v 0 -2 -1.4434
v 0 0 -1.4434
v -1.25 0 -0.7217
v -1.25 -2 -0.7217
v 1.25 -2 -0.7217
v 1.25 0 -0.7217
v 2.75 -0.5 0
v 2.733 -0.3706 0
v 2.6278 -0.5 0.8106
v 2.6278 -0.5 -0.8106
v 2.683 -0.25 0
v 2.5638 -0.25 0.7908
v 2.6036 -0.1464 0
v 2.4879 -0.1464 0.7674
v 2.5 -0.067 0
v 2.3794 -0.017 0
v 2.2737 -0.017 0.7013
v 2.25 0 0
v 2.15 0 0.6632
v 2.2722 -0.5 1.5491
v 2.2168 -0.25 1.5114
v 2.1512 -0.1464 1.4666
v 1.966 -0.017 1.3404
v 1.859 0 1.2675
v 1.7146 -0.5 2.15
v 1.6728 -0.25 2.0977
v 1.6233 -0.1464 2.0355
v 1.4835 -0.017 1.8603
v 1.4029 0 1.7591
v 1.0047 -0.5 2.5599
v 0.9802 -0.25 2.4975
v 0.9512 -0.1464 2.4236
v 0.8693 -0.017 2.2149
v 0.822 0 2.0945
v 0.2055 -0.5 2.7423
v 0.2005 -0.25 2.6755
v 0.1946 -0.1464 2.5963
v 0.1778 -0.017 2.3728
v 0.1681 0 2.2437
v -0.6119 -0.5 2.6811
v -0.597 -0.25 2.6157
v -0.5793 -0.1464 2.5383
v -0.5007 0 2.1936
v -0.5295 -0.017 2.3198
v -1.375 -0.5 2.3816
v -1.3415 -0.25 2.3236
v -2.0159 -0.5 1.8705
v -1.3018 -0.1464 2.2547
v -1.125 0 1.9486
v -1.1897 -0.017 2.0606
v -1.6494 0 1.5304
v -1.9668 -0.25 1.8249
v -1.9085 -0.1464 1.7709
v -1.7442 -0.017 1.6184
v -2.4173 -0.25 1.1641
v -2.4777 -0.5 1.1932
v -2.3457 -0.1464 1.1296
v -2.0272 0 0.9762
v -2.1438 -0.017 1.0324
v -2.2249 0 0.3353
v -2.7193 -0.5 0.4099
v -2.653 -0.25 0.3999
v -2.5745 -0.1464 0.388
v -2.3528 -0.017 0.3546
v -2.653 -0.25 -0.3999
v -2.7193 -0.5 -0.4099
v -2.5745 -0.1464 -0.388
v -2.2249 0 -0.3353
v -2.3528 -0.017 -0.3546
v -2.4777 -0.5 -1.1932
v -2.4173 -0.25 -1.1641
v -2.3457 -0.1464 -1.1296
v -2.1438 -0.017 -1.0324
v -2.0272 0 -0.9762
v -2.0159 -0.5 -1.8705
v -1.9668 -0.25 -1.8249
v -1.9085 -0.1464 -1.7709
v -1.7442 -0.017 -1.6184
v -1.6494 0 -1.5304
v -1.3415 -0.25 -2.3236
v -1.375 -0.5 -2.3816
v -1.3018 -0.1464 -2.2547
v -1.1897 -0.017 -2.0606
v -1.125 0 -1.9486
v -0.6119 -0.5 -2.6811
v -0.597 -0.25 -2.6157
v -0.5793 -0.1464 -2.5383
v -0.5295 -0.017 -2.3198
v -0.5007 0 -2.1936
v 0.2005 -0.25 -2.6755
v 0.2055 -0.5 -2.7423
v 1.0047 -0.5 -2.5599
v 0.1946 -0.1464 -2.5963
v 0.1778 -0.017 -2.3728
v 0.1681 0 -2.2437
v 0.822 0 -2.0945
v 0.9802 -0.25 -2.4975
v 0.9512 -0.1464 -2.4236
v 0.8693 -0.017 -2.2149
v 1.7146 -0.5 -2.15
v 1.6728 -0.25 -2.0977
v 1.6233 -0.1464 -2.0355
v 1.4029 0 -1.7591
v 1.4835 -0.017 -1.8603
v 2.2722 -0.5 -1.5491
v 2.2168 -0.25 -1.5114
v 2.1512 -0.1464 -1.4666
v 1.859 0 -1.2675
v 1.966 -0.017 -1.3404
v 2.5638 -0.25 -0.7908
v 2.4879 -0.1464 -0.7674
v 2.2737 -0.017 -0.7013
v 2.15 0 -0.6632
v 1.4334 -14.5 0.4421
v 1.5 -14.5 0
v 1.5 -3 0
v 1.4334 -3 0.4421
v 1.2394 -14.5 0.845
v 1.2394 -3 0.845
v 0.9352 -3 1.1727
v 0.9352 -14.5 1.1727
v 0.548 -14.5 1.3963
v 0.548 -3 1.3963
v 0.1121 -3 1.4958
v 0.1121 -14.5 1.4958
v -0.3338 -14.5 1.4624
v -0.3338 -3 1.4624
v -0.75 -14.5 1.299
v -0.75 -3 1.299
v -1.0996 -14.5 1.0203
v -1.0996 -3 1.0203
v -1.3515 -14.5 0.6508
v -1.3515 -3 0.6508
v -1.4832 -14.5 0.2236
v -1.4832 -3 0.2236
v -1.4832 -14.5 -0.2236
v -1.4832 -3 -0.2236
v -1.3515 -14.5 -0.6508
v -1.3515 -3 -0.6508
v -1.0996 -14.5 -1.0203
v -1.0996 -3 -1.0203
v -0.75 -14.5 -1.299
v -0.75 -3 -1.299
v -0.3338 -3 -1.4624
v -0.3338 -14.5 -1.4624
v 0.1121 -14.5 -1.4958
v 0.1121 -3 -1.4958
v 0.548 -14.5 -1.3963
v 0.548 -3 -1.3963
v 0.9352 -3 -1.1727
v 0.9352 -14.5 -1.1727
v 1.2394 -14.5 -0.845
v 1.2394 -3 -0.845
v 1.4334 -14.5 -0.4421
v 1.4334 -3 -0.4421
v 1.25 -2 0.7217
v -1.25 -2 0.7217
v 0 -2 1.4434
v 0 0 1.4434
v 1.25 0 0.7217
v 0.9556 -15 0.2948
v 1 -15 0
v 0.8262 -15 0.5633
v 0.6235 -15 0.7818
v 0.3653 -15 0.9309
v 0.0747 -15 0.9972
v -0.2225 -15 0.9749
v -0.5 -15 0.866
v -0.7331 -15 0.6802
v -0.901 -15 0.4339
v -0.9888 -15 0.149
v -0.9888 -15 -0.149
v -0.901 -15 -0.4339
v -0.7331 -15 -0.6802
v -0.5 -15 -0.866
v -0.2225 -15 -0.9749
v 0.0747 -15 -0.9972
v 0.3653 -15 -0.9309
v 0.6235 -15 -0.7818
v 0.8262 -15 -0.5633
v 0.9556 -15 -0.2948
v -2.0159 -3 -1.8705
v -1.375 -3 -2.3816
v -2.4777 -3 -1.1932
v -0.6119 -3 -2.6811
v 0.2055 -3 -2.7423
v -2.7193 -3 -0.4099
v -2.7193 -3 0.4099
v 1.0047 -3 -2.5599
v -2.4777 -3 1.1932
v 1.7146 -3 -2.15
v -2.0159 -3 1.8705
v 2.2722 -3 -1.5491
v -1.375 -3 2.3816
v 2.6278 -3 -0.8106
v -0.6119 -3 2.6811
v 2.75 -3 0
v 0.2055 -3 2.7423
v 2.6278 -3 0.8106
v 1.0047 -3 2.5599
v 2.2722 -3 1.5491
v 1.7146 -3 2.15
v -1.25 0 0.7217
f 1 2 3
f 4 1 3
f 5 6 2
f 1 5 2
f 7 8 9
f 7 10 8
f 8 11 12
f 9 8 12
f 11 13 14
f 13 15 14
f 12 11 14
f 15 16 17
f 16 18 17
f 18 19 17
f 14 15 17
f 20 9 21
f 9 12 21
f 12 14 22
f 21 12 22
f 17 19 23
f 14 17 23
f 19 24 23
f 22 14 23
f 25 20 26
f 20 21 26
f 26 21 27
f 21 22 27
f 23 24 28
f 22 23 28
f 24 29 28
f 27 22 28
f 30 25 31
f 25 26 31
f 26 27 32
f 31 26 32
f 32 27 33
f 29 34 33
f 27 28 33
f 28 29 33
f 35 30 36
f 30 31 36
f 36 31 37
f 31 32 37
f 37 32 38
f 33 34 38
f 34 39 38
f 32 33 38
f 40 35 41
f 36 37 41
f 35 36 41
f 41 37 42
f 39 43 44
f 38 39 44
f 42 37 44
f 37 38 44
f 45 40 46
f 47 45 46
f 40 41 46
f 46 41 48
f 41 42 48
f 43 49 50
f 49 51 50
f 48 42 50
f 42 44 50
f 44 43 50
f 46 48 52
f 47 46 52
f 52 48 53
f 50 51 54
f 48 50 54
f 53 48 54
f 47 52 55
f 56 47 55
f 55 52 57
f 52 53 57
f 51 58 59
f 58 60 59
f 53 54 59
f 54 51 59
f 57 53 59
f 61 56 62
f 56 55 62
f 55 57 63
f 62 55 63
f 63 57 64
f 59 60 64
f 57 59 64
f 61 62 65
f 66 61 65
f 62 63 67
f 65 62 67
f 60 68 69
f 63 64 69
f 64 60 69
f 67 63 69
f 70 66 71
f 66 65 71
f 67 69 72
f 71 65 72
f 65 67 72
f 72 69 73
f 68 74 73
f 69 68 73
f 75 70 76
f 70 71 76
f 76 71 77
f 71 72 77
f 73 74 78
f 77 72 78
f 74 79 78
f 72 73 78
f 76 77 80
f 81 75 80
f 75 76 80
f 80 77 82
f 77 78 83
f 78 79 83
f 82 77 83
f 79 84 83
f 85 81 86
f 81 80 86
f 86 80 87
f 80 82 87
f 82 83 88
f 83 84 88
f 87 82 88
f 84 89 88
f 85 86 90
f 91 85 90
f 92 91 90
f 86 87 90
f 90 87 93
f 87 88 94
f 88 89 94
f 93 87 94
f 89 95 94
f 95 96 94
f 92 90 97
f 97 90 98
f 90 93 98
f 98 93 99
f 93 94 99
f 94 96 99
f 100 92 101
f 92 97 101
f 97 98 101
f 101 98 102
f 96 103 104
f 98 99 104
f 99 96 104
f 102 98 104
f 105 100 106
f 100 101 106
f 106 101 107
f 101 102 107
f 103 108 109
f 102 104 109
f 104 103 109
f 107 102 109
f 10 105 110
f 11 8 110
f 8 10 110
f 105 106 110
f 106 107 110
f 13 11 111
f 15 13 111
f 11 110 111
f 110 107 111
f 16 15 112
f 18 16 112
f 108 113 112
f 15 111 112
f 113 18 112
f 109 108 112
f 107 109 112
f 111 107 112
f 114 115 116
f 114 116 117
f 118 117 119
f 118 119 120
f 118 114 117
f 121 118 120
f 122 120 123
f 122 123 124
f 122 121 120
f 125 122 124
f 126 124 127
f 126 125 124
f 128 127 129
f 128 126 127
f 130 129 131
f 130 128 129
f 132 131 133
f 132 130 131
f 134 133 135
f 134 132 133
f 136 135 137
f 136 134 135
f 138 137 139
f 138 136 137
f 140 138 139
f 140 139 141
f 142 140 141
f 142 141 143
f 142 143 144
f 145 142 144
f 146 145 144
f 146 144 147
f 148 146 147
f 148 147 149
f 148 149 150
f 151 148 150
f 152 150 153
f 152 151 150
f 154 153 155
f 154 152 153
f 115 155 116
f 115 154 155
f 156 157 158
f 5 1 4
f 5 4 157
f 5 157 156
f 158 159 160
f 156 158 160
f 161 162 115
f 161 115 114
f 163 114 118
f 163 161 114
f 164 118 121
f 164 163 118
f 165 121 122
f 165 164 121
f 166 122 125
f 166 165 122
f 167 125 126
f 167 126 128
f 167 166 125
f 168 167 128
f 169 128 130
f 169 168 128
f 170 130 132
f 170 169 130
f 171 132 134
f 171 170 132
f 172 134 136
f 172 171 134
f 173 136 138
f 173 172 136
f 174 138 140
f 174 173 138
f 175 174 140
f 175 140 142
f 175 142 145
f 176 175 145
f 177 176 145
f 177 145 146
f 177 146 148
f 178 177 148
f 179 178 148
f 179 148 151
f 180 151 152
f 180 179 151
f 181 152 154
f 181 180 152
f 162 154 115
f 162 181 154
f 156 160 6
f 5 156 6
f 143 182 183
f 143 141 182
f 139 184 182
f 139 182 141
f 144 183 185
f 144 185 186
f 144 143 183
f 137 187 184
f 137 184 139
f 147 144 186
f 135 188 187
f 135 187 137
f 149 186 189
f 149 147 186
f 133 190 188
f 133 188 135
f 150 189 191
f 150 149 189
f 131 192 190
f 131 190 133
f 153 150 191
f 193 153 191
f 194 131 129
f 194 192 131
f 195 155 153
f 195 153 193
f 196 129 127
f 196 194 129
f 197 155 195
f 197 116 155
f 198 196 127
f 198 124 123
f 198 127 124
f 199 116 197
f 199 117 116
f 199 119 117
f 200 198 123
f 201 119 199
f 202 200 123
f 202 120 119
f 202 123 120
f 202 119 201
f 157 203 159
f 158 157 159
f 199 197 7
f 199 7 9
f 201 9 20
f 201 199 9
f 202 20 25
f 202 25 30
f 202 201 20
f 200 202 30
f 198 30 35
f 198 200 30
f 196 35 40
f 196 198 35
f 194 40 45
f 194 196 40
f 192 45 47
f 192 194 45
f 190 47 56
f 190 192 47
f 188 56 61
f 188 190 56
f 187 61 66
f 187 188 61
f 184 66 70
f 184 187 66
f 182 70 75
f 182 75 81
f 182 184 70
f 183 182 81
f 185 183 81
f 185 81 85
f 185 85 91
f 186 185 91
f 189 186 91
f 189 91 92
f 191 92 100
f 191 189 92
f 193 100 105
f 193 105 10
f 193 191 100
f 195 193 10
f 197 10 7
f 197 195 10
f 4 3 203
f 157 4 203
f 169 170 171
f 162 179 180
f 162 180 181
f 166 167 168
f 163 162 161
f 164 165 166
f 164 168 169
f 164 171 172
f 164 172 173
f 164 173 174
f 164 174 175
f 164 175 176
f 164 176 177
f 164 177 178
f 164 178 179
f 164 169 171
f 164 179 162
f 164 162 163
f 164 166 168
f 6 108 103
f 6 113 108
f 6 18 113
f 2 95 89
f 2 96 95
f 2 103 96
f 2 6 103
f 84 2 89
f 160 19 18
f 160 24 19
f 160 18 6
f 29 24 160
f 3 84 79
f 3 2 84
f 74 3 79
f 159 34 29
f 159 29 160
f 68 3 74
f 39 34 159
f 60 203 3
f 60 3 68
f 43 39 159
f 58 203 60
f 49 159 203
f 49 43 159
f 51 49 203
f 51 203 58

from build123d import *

# Parameters (mm, degrees)
CORTAR_EXTRUIR1_DEPTH = 2
CHAFL_N1_SIZE         = 0.5
REDONDEO1_R           = 0.5


with BuildPart() as part:
    # Croquis1 → Revolución1 (revolve)
    with BuildSketch(Plane.XY):
        Polygon((0, 0), (2.75, 0), (2.75, -3), (1.5, -3), (1.5, -15), (0, -15), align=None)
    revolve(axis=Axis((0, 0, 0), (0, -1, 0)))

    # Croquis2 → Cortar-Extruir1 (cut)
    with BuildSketch(Plane(origin=(0, 0, 0), x_dir=(1, 0, 0), z_dir=(0, 1, 0))):
        Polygon((1.25, 0.721687836), (0, 1.443375673), (-1.25, 0.721687836), (-1.25, -0.721687836), (0, -1.443375673), (1.25, -0.721687836), align=None)
    extrude(amount=-CORTAR_EXTRUIR1_DEPTH, mode=Mode.SUBTRACT)

    # Chaflán1
    chafl_n1_edges = [part.edges().sort_by_distance(p)[0] for p in [
        (-1.5, -15, 0),
    ]]
    chamfer(chafl_n1_edges, length=CHAFL_N1_SIZE)

    # Redondeo1
    redondeo1_edges = [part.edges().sort_by_distance(p)[0] for p in [
        (-2.75, 0, 0),
    ]]
    fillet(redondeo1_edges, radius=REDONDEO1_R)


solid = part.part
